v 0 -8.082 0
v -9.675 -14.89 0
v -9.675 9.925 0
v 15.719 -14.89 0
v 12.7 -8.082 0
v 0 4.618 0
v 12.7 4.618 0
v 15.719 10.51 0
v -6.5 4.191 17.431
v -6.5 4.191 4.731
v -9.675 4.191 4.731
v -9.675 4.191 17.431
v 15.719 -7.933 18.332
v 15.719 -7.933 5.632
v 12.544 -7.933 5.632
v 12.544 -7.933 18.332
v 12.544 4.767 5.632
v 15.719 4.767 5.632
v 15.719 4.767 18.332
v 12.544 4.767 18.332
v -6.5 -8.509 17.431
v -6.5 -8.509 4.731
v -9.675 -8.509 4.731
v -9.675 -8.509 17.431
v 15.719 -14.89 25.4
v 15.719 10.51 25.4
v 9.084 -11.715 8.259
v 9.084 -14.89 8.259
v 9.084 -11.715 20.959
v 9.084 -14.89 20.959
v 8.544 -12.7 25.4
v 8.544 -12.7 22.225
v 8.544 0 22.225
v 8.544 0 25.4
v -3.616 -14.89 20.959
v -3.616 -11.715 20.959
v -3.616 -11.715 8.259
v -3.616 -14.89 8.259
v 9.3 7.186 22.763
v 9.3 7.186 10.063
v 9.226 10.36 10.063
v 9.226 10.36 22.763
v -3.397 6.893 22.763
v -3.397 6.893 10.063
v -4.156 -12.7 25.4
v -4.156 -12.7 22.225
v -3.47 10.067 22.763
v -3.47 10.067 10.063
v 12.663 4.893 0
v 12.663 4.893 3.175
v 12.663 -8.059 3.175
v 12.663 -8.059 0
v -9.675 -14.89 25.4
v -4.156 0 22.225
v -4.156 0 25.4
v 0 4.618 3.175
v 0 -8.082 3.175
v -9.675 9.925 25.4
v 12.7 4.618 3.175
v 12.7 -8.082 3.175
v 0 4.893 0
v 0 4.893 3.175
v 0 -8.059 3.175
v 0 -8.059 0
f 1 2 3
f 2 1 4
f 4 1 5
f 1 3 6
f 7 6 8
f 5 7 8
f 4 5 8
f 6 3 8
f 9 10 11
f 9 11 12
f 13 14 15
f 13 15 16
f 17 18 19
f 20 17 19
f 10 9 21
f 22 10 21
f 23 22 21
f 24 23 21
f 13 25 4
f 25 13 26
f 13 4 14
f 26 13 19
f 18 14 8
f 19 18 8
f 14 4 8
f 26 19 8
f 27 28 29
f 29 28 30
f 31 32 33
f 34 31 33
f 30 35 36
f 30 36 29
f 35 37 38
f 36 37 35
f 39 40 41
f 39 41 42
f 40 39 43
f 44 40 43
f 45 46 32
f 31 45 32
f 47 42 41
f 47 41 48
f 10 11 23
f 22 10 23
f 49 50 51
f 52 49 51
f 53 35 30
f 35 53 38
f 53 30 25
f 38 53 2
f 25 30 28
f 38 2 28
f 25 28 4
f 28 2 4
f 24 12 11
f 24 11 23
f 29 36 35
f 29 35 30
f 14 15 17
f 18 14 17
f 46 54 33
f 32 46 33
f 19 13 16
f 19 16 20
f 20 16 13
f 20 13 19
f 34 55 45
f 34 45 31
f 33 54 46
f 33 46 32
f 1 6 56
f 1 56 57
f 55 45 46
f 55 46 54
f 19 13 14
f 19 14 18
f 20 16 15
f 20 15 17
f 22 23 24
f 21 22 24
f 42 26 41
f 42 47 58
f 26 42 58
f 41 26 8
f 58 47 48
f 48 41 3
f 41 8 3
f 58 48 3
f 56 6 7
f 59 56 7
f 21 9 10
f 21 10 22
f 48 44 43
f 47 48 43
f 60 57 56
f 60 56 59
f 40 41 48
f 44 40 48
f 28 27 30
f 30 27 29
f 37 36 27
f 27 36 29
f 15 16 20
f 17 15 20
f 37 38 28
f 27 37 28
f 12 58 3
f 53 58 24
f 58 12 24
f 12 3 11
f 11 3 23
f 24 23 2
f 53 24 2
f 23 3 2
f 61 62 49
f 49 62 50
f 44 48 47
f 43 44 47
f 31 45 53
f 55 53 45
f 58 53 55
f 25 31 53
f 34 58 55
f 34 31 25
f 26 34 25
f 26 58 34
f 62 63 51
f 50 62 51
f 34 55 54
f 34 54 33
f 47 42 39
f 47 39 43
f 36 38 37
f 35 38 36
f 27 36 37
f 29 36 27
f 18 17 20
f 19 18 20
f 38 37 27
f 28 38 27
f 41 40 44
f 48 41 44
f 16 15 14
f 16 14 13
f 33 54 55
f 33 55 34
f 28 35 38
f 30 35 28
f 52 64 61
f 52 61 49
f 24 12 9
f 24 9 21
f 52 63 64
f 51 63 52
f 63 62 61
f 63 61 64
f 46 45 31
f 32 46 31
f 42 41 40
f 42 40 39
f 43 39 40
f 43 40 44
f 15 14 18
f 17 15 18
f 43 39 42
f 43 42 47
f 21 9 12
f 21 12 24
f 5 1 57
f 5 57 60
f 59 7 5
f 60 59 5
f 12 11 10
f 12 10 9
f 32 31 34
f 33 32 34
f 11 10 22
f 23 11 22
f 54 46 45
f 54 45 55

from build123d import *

# Parameters (mm, degrees)
F1_DEPTH  = 25.4
F2_W      = 12.7
F2_H      = 12.7
F3_DEPTH  = 3.175
F4_W      = 12.7
F4_H      = 12.7
F5_DEPTH  = 3.175
F6_W      = 12.7
F6_H      = 12.7
F7_DEPTH  = 3.175
F8_W      = 12.7
F8_H      = 12.7
F9_DEPTH  = 3.175
F10_W     = 12.7
F10_H     = 12.7
F11_DEPTH = 3.175
F12_W     = 12.7
F12_H     = 12.7
F13_DEPTH = 3.175
F14_W     = 12.7
F14_H     = 12.7
F15_DEPTH = 3.175
F16_W     = 12.7
F16_H     = 12.7
F18_DEPTH = 3.175
F19_W     = 12.7
F19_H     = 12.7
F21_DEPTH = 3.175
F22_W     = 12.7
F22_H     = 12.7
F23_DEPTH = 3.175
F24_W     = 12.7
F24_H     = 12.7
F25_DEPTH = 3.175
F27_W     = 12.6634519547
F27_H     = 12.9512590356
F28_DEPTH = 3.175


with BuildPart() as f1:
    # F0 (on Top) → F1 (new body)
    with BuildSketch(Plane.XY):
        Polygon((15.7185920732, 10.5096250758), (-9.6746680545, 9.9245267207), (-9.6746680545, -14.8903749242), (15.7185920732, -14.8903749242), align=None)
    extrude(amount=F1_DEPTH)

    # F2 (on face) → F3 (cut)
    with BuildSketch(Plane.XY.offset(25.4)):
        with Locations((2.1936363501, -6.35)):
            Rectangle(F2_W, F2_H)
    extrude(amount=-F3_DEPTH, mode=Mode.SUBTRACT)

    # F4 (on face) → F5 (cut)
    with BuildSketch(Plane.YZ.offset(15.7185920732)):
        with Locations((-1.5829310287, 11.9817761521)):
            Rectangle(F4_W, F4_H)
    extrude(amount=-F5_DEPTH, mode=Mode.SUBTRACT)

    # F6 (on face) → F7 (cut)
    with BuildSketch(Plane.XZ.offset(14.8903749242)):
        with Locations((2.7341544628, 14.6086736287)):
            Rectangle(F6_W, F6_H)
    extrude(amount=-F7_DEPTH, mode=Mode.SUBTRACT)

    # F8 (on face) → F9 (cut)
    with BuildSketch(Plane(origin=(0, 0, 0), x_dir=(1, 0, 0), z_dir=(0, 0, -1))):
        with Locations((6.35, 1.7318187479)):
            Rectangle(F8_W, F8_H)
    extrude(amount=-F9_DEPTH, mode=Mode.SUBTRACT)

    # F10 (on face) → F11 (cut)
    with BuildSketch(Plane(origin=(-0.2336881171, 10.1420608934, 0), x_dir=(-0.9997346507, -0.0230353683, 0), z_dir=(-0.0230353683, 0.9997346507, 0))):
        with Locations((-3.112571314, 16.4134004896)):
            Rectangle(F10_W, F10_H)
    extrude(amount=-F11_DEPTH, mode=Mode.SUBTRACT)

    # F12 (on face) → F13 (cut)
    with BuildSketch(Plane(origin=(-9.6746680545, 0, 0), x_dir=(0, -1, 0), z_dir=(-1, 0, 0))):
        with Locations((2.1585428622, 11.0805242696)):
            Rectangle(F12_W, F12_H)
    extrude(amount=-F13_DEPTH, mode=Mode.SUBTRACT)


with BuildPart() as f15:
    # F14 (on face) → F15 (new body)
    with BuildSketch(Plane.XY.offset(22.225)):
        with Locations((2.1936363501, -6.35)):
            Rectangle(F14_W, F14_H)
    extrude(amount=F15_DEPTH)


with BuildPart() as f18:
    # F16 (on face) → F18 (new body)
    with BuildSketch(Plane.YZ.offset(12.5435920732)):
        with Locations((-1.5829310287, 11.9817761521)):
            Rectangle(F16_W, F16_H)
    extrude(amount=F18_DEPTH)


with BuildPart() as f21:
    # F19 (on face) → F21 (new body)
    with BuildSketch(Plane(origin=(-0.1605508227, 6.9679033774, 0), x_dir=(-0.9997346507, -0.0230353683, 0), z_dir=(-0.0230353683, 0.9997346507, 0))):
        with Locations((-3.112571314, 16.4134004896)):
            Rectangle(F19_W, F19_H)
    extrude(amount=F21_DEPTH)


with BuildPart() as f23:
    # F22 (on face) → F23 (new body)
    with BuildSketch(Plane(origin=(-6.4996680545, 0, 0), x_dir=(0, -1, 0), z_dir=(-1, 0, 0))):
        with Locations((2.1585428622, 11.0805242696)):
            Rectangle(F22_W, F22_H)
    extrude(amount=F23_DEPTH)


with BuildPart() as f25:
    # F24 (on face) → F25 (new body)
    with BuildSketch(Plane.XZ.offset(11.7153749242)):
        with Locations((2.7341544628, 14.6086736287)):
            Rectangle(F24_W, F24_H)
    extrude(amount=F25_DEPTH)


with BuildPart() as f28:
    # F27 (on face) → F28 (new body)
    with BuildSketch(Plane(origin=(0, 0, 3.175), x_dir=(1, 0, 0), z_dir=(0, 0, -1))):
        with Locations((6.3317259774, 1.5829314943)):
            Rectangle(F27_W, F27_H)
    extrude(amount=F28_DEPTH)


solid = Compound([f1.part, f15.part, f18.part, f21.part, f23.part, f25.part, f28.part])
